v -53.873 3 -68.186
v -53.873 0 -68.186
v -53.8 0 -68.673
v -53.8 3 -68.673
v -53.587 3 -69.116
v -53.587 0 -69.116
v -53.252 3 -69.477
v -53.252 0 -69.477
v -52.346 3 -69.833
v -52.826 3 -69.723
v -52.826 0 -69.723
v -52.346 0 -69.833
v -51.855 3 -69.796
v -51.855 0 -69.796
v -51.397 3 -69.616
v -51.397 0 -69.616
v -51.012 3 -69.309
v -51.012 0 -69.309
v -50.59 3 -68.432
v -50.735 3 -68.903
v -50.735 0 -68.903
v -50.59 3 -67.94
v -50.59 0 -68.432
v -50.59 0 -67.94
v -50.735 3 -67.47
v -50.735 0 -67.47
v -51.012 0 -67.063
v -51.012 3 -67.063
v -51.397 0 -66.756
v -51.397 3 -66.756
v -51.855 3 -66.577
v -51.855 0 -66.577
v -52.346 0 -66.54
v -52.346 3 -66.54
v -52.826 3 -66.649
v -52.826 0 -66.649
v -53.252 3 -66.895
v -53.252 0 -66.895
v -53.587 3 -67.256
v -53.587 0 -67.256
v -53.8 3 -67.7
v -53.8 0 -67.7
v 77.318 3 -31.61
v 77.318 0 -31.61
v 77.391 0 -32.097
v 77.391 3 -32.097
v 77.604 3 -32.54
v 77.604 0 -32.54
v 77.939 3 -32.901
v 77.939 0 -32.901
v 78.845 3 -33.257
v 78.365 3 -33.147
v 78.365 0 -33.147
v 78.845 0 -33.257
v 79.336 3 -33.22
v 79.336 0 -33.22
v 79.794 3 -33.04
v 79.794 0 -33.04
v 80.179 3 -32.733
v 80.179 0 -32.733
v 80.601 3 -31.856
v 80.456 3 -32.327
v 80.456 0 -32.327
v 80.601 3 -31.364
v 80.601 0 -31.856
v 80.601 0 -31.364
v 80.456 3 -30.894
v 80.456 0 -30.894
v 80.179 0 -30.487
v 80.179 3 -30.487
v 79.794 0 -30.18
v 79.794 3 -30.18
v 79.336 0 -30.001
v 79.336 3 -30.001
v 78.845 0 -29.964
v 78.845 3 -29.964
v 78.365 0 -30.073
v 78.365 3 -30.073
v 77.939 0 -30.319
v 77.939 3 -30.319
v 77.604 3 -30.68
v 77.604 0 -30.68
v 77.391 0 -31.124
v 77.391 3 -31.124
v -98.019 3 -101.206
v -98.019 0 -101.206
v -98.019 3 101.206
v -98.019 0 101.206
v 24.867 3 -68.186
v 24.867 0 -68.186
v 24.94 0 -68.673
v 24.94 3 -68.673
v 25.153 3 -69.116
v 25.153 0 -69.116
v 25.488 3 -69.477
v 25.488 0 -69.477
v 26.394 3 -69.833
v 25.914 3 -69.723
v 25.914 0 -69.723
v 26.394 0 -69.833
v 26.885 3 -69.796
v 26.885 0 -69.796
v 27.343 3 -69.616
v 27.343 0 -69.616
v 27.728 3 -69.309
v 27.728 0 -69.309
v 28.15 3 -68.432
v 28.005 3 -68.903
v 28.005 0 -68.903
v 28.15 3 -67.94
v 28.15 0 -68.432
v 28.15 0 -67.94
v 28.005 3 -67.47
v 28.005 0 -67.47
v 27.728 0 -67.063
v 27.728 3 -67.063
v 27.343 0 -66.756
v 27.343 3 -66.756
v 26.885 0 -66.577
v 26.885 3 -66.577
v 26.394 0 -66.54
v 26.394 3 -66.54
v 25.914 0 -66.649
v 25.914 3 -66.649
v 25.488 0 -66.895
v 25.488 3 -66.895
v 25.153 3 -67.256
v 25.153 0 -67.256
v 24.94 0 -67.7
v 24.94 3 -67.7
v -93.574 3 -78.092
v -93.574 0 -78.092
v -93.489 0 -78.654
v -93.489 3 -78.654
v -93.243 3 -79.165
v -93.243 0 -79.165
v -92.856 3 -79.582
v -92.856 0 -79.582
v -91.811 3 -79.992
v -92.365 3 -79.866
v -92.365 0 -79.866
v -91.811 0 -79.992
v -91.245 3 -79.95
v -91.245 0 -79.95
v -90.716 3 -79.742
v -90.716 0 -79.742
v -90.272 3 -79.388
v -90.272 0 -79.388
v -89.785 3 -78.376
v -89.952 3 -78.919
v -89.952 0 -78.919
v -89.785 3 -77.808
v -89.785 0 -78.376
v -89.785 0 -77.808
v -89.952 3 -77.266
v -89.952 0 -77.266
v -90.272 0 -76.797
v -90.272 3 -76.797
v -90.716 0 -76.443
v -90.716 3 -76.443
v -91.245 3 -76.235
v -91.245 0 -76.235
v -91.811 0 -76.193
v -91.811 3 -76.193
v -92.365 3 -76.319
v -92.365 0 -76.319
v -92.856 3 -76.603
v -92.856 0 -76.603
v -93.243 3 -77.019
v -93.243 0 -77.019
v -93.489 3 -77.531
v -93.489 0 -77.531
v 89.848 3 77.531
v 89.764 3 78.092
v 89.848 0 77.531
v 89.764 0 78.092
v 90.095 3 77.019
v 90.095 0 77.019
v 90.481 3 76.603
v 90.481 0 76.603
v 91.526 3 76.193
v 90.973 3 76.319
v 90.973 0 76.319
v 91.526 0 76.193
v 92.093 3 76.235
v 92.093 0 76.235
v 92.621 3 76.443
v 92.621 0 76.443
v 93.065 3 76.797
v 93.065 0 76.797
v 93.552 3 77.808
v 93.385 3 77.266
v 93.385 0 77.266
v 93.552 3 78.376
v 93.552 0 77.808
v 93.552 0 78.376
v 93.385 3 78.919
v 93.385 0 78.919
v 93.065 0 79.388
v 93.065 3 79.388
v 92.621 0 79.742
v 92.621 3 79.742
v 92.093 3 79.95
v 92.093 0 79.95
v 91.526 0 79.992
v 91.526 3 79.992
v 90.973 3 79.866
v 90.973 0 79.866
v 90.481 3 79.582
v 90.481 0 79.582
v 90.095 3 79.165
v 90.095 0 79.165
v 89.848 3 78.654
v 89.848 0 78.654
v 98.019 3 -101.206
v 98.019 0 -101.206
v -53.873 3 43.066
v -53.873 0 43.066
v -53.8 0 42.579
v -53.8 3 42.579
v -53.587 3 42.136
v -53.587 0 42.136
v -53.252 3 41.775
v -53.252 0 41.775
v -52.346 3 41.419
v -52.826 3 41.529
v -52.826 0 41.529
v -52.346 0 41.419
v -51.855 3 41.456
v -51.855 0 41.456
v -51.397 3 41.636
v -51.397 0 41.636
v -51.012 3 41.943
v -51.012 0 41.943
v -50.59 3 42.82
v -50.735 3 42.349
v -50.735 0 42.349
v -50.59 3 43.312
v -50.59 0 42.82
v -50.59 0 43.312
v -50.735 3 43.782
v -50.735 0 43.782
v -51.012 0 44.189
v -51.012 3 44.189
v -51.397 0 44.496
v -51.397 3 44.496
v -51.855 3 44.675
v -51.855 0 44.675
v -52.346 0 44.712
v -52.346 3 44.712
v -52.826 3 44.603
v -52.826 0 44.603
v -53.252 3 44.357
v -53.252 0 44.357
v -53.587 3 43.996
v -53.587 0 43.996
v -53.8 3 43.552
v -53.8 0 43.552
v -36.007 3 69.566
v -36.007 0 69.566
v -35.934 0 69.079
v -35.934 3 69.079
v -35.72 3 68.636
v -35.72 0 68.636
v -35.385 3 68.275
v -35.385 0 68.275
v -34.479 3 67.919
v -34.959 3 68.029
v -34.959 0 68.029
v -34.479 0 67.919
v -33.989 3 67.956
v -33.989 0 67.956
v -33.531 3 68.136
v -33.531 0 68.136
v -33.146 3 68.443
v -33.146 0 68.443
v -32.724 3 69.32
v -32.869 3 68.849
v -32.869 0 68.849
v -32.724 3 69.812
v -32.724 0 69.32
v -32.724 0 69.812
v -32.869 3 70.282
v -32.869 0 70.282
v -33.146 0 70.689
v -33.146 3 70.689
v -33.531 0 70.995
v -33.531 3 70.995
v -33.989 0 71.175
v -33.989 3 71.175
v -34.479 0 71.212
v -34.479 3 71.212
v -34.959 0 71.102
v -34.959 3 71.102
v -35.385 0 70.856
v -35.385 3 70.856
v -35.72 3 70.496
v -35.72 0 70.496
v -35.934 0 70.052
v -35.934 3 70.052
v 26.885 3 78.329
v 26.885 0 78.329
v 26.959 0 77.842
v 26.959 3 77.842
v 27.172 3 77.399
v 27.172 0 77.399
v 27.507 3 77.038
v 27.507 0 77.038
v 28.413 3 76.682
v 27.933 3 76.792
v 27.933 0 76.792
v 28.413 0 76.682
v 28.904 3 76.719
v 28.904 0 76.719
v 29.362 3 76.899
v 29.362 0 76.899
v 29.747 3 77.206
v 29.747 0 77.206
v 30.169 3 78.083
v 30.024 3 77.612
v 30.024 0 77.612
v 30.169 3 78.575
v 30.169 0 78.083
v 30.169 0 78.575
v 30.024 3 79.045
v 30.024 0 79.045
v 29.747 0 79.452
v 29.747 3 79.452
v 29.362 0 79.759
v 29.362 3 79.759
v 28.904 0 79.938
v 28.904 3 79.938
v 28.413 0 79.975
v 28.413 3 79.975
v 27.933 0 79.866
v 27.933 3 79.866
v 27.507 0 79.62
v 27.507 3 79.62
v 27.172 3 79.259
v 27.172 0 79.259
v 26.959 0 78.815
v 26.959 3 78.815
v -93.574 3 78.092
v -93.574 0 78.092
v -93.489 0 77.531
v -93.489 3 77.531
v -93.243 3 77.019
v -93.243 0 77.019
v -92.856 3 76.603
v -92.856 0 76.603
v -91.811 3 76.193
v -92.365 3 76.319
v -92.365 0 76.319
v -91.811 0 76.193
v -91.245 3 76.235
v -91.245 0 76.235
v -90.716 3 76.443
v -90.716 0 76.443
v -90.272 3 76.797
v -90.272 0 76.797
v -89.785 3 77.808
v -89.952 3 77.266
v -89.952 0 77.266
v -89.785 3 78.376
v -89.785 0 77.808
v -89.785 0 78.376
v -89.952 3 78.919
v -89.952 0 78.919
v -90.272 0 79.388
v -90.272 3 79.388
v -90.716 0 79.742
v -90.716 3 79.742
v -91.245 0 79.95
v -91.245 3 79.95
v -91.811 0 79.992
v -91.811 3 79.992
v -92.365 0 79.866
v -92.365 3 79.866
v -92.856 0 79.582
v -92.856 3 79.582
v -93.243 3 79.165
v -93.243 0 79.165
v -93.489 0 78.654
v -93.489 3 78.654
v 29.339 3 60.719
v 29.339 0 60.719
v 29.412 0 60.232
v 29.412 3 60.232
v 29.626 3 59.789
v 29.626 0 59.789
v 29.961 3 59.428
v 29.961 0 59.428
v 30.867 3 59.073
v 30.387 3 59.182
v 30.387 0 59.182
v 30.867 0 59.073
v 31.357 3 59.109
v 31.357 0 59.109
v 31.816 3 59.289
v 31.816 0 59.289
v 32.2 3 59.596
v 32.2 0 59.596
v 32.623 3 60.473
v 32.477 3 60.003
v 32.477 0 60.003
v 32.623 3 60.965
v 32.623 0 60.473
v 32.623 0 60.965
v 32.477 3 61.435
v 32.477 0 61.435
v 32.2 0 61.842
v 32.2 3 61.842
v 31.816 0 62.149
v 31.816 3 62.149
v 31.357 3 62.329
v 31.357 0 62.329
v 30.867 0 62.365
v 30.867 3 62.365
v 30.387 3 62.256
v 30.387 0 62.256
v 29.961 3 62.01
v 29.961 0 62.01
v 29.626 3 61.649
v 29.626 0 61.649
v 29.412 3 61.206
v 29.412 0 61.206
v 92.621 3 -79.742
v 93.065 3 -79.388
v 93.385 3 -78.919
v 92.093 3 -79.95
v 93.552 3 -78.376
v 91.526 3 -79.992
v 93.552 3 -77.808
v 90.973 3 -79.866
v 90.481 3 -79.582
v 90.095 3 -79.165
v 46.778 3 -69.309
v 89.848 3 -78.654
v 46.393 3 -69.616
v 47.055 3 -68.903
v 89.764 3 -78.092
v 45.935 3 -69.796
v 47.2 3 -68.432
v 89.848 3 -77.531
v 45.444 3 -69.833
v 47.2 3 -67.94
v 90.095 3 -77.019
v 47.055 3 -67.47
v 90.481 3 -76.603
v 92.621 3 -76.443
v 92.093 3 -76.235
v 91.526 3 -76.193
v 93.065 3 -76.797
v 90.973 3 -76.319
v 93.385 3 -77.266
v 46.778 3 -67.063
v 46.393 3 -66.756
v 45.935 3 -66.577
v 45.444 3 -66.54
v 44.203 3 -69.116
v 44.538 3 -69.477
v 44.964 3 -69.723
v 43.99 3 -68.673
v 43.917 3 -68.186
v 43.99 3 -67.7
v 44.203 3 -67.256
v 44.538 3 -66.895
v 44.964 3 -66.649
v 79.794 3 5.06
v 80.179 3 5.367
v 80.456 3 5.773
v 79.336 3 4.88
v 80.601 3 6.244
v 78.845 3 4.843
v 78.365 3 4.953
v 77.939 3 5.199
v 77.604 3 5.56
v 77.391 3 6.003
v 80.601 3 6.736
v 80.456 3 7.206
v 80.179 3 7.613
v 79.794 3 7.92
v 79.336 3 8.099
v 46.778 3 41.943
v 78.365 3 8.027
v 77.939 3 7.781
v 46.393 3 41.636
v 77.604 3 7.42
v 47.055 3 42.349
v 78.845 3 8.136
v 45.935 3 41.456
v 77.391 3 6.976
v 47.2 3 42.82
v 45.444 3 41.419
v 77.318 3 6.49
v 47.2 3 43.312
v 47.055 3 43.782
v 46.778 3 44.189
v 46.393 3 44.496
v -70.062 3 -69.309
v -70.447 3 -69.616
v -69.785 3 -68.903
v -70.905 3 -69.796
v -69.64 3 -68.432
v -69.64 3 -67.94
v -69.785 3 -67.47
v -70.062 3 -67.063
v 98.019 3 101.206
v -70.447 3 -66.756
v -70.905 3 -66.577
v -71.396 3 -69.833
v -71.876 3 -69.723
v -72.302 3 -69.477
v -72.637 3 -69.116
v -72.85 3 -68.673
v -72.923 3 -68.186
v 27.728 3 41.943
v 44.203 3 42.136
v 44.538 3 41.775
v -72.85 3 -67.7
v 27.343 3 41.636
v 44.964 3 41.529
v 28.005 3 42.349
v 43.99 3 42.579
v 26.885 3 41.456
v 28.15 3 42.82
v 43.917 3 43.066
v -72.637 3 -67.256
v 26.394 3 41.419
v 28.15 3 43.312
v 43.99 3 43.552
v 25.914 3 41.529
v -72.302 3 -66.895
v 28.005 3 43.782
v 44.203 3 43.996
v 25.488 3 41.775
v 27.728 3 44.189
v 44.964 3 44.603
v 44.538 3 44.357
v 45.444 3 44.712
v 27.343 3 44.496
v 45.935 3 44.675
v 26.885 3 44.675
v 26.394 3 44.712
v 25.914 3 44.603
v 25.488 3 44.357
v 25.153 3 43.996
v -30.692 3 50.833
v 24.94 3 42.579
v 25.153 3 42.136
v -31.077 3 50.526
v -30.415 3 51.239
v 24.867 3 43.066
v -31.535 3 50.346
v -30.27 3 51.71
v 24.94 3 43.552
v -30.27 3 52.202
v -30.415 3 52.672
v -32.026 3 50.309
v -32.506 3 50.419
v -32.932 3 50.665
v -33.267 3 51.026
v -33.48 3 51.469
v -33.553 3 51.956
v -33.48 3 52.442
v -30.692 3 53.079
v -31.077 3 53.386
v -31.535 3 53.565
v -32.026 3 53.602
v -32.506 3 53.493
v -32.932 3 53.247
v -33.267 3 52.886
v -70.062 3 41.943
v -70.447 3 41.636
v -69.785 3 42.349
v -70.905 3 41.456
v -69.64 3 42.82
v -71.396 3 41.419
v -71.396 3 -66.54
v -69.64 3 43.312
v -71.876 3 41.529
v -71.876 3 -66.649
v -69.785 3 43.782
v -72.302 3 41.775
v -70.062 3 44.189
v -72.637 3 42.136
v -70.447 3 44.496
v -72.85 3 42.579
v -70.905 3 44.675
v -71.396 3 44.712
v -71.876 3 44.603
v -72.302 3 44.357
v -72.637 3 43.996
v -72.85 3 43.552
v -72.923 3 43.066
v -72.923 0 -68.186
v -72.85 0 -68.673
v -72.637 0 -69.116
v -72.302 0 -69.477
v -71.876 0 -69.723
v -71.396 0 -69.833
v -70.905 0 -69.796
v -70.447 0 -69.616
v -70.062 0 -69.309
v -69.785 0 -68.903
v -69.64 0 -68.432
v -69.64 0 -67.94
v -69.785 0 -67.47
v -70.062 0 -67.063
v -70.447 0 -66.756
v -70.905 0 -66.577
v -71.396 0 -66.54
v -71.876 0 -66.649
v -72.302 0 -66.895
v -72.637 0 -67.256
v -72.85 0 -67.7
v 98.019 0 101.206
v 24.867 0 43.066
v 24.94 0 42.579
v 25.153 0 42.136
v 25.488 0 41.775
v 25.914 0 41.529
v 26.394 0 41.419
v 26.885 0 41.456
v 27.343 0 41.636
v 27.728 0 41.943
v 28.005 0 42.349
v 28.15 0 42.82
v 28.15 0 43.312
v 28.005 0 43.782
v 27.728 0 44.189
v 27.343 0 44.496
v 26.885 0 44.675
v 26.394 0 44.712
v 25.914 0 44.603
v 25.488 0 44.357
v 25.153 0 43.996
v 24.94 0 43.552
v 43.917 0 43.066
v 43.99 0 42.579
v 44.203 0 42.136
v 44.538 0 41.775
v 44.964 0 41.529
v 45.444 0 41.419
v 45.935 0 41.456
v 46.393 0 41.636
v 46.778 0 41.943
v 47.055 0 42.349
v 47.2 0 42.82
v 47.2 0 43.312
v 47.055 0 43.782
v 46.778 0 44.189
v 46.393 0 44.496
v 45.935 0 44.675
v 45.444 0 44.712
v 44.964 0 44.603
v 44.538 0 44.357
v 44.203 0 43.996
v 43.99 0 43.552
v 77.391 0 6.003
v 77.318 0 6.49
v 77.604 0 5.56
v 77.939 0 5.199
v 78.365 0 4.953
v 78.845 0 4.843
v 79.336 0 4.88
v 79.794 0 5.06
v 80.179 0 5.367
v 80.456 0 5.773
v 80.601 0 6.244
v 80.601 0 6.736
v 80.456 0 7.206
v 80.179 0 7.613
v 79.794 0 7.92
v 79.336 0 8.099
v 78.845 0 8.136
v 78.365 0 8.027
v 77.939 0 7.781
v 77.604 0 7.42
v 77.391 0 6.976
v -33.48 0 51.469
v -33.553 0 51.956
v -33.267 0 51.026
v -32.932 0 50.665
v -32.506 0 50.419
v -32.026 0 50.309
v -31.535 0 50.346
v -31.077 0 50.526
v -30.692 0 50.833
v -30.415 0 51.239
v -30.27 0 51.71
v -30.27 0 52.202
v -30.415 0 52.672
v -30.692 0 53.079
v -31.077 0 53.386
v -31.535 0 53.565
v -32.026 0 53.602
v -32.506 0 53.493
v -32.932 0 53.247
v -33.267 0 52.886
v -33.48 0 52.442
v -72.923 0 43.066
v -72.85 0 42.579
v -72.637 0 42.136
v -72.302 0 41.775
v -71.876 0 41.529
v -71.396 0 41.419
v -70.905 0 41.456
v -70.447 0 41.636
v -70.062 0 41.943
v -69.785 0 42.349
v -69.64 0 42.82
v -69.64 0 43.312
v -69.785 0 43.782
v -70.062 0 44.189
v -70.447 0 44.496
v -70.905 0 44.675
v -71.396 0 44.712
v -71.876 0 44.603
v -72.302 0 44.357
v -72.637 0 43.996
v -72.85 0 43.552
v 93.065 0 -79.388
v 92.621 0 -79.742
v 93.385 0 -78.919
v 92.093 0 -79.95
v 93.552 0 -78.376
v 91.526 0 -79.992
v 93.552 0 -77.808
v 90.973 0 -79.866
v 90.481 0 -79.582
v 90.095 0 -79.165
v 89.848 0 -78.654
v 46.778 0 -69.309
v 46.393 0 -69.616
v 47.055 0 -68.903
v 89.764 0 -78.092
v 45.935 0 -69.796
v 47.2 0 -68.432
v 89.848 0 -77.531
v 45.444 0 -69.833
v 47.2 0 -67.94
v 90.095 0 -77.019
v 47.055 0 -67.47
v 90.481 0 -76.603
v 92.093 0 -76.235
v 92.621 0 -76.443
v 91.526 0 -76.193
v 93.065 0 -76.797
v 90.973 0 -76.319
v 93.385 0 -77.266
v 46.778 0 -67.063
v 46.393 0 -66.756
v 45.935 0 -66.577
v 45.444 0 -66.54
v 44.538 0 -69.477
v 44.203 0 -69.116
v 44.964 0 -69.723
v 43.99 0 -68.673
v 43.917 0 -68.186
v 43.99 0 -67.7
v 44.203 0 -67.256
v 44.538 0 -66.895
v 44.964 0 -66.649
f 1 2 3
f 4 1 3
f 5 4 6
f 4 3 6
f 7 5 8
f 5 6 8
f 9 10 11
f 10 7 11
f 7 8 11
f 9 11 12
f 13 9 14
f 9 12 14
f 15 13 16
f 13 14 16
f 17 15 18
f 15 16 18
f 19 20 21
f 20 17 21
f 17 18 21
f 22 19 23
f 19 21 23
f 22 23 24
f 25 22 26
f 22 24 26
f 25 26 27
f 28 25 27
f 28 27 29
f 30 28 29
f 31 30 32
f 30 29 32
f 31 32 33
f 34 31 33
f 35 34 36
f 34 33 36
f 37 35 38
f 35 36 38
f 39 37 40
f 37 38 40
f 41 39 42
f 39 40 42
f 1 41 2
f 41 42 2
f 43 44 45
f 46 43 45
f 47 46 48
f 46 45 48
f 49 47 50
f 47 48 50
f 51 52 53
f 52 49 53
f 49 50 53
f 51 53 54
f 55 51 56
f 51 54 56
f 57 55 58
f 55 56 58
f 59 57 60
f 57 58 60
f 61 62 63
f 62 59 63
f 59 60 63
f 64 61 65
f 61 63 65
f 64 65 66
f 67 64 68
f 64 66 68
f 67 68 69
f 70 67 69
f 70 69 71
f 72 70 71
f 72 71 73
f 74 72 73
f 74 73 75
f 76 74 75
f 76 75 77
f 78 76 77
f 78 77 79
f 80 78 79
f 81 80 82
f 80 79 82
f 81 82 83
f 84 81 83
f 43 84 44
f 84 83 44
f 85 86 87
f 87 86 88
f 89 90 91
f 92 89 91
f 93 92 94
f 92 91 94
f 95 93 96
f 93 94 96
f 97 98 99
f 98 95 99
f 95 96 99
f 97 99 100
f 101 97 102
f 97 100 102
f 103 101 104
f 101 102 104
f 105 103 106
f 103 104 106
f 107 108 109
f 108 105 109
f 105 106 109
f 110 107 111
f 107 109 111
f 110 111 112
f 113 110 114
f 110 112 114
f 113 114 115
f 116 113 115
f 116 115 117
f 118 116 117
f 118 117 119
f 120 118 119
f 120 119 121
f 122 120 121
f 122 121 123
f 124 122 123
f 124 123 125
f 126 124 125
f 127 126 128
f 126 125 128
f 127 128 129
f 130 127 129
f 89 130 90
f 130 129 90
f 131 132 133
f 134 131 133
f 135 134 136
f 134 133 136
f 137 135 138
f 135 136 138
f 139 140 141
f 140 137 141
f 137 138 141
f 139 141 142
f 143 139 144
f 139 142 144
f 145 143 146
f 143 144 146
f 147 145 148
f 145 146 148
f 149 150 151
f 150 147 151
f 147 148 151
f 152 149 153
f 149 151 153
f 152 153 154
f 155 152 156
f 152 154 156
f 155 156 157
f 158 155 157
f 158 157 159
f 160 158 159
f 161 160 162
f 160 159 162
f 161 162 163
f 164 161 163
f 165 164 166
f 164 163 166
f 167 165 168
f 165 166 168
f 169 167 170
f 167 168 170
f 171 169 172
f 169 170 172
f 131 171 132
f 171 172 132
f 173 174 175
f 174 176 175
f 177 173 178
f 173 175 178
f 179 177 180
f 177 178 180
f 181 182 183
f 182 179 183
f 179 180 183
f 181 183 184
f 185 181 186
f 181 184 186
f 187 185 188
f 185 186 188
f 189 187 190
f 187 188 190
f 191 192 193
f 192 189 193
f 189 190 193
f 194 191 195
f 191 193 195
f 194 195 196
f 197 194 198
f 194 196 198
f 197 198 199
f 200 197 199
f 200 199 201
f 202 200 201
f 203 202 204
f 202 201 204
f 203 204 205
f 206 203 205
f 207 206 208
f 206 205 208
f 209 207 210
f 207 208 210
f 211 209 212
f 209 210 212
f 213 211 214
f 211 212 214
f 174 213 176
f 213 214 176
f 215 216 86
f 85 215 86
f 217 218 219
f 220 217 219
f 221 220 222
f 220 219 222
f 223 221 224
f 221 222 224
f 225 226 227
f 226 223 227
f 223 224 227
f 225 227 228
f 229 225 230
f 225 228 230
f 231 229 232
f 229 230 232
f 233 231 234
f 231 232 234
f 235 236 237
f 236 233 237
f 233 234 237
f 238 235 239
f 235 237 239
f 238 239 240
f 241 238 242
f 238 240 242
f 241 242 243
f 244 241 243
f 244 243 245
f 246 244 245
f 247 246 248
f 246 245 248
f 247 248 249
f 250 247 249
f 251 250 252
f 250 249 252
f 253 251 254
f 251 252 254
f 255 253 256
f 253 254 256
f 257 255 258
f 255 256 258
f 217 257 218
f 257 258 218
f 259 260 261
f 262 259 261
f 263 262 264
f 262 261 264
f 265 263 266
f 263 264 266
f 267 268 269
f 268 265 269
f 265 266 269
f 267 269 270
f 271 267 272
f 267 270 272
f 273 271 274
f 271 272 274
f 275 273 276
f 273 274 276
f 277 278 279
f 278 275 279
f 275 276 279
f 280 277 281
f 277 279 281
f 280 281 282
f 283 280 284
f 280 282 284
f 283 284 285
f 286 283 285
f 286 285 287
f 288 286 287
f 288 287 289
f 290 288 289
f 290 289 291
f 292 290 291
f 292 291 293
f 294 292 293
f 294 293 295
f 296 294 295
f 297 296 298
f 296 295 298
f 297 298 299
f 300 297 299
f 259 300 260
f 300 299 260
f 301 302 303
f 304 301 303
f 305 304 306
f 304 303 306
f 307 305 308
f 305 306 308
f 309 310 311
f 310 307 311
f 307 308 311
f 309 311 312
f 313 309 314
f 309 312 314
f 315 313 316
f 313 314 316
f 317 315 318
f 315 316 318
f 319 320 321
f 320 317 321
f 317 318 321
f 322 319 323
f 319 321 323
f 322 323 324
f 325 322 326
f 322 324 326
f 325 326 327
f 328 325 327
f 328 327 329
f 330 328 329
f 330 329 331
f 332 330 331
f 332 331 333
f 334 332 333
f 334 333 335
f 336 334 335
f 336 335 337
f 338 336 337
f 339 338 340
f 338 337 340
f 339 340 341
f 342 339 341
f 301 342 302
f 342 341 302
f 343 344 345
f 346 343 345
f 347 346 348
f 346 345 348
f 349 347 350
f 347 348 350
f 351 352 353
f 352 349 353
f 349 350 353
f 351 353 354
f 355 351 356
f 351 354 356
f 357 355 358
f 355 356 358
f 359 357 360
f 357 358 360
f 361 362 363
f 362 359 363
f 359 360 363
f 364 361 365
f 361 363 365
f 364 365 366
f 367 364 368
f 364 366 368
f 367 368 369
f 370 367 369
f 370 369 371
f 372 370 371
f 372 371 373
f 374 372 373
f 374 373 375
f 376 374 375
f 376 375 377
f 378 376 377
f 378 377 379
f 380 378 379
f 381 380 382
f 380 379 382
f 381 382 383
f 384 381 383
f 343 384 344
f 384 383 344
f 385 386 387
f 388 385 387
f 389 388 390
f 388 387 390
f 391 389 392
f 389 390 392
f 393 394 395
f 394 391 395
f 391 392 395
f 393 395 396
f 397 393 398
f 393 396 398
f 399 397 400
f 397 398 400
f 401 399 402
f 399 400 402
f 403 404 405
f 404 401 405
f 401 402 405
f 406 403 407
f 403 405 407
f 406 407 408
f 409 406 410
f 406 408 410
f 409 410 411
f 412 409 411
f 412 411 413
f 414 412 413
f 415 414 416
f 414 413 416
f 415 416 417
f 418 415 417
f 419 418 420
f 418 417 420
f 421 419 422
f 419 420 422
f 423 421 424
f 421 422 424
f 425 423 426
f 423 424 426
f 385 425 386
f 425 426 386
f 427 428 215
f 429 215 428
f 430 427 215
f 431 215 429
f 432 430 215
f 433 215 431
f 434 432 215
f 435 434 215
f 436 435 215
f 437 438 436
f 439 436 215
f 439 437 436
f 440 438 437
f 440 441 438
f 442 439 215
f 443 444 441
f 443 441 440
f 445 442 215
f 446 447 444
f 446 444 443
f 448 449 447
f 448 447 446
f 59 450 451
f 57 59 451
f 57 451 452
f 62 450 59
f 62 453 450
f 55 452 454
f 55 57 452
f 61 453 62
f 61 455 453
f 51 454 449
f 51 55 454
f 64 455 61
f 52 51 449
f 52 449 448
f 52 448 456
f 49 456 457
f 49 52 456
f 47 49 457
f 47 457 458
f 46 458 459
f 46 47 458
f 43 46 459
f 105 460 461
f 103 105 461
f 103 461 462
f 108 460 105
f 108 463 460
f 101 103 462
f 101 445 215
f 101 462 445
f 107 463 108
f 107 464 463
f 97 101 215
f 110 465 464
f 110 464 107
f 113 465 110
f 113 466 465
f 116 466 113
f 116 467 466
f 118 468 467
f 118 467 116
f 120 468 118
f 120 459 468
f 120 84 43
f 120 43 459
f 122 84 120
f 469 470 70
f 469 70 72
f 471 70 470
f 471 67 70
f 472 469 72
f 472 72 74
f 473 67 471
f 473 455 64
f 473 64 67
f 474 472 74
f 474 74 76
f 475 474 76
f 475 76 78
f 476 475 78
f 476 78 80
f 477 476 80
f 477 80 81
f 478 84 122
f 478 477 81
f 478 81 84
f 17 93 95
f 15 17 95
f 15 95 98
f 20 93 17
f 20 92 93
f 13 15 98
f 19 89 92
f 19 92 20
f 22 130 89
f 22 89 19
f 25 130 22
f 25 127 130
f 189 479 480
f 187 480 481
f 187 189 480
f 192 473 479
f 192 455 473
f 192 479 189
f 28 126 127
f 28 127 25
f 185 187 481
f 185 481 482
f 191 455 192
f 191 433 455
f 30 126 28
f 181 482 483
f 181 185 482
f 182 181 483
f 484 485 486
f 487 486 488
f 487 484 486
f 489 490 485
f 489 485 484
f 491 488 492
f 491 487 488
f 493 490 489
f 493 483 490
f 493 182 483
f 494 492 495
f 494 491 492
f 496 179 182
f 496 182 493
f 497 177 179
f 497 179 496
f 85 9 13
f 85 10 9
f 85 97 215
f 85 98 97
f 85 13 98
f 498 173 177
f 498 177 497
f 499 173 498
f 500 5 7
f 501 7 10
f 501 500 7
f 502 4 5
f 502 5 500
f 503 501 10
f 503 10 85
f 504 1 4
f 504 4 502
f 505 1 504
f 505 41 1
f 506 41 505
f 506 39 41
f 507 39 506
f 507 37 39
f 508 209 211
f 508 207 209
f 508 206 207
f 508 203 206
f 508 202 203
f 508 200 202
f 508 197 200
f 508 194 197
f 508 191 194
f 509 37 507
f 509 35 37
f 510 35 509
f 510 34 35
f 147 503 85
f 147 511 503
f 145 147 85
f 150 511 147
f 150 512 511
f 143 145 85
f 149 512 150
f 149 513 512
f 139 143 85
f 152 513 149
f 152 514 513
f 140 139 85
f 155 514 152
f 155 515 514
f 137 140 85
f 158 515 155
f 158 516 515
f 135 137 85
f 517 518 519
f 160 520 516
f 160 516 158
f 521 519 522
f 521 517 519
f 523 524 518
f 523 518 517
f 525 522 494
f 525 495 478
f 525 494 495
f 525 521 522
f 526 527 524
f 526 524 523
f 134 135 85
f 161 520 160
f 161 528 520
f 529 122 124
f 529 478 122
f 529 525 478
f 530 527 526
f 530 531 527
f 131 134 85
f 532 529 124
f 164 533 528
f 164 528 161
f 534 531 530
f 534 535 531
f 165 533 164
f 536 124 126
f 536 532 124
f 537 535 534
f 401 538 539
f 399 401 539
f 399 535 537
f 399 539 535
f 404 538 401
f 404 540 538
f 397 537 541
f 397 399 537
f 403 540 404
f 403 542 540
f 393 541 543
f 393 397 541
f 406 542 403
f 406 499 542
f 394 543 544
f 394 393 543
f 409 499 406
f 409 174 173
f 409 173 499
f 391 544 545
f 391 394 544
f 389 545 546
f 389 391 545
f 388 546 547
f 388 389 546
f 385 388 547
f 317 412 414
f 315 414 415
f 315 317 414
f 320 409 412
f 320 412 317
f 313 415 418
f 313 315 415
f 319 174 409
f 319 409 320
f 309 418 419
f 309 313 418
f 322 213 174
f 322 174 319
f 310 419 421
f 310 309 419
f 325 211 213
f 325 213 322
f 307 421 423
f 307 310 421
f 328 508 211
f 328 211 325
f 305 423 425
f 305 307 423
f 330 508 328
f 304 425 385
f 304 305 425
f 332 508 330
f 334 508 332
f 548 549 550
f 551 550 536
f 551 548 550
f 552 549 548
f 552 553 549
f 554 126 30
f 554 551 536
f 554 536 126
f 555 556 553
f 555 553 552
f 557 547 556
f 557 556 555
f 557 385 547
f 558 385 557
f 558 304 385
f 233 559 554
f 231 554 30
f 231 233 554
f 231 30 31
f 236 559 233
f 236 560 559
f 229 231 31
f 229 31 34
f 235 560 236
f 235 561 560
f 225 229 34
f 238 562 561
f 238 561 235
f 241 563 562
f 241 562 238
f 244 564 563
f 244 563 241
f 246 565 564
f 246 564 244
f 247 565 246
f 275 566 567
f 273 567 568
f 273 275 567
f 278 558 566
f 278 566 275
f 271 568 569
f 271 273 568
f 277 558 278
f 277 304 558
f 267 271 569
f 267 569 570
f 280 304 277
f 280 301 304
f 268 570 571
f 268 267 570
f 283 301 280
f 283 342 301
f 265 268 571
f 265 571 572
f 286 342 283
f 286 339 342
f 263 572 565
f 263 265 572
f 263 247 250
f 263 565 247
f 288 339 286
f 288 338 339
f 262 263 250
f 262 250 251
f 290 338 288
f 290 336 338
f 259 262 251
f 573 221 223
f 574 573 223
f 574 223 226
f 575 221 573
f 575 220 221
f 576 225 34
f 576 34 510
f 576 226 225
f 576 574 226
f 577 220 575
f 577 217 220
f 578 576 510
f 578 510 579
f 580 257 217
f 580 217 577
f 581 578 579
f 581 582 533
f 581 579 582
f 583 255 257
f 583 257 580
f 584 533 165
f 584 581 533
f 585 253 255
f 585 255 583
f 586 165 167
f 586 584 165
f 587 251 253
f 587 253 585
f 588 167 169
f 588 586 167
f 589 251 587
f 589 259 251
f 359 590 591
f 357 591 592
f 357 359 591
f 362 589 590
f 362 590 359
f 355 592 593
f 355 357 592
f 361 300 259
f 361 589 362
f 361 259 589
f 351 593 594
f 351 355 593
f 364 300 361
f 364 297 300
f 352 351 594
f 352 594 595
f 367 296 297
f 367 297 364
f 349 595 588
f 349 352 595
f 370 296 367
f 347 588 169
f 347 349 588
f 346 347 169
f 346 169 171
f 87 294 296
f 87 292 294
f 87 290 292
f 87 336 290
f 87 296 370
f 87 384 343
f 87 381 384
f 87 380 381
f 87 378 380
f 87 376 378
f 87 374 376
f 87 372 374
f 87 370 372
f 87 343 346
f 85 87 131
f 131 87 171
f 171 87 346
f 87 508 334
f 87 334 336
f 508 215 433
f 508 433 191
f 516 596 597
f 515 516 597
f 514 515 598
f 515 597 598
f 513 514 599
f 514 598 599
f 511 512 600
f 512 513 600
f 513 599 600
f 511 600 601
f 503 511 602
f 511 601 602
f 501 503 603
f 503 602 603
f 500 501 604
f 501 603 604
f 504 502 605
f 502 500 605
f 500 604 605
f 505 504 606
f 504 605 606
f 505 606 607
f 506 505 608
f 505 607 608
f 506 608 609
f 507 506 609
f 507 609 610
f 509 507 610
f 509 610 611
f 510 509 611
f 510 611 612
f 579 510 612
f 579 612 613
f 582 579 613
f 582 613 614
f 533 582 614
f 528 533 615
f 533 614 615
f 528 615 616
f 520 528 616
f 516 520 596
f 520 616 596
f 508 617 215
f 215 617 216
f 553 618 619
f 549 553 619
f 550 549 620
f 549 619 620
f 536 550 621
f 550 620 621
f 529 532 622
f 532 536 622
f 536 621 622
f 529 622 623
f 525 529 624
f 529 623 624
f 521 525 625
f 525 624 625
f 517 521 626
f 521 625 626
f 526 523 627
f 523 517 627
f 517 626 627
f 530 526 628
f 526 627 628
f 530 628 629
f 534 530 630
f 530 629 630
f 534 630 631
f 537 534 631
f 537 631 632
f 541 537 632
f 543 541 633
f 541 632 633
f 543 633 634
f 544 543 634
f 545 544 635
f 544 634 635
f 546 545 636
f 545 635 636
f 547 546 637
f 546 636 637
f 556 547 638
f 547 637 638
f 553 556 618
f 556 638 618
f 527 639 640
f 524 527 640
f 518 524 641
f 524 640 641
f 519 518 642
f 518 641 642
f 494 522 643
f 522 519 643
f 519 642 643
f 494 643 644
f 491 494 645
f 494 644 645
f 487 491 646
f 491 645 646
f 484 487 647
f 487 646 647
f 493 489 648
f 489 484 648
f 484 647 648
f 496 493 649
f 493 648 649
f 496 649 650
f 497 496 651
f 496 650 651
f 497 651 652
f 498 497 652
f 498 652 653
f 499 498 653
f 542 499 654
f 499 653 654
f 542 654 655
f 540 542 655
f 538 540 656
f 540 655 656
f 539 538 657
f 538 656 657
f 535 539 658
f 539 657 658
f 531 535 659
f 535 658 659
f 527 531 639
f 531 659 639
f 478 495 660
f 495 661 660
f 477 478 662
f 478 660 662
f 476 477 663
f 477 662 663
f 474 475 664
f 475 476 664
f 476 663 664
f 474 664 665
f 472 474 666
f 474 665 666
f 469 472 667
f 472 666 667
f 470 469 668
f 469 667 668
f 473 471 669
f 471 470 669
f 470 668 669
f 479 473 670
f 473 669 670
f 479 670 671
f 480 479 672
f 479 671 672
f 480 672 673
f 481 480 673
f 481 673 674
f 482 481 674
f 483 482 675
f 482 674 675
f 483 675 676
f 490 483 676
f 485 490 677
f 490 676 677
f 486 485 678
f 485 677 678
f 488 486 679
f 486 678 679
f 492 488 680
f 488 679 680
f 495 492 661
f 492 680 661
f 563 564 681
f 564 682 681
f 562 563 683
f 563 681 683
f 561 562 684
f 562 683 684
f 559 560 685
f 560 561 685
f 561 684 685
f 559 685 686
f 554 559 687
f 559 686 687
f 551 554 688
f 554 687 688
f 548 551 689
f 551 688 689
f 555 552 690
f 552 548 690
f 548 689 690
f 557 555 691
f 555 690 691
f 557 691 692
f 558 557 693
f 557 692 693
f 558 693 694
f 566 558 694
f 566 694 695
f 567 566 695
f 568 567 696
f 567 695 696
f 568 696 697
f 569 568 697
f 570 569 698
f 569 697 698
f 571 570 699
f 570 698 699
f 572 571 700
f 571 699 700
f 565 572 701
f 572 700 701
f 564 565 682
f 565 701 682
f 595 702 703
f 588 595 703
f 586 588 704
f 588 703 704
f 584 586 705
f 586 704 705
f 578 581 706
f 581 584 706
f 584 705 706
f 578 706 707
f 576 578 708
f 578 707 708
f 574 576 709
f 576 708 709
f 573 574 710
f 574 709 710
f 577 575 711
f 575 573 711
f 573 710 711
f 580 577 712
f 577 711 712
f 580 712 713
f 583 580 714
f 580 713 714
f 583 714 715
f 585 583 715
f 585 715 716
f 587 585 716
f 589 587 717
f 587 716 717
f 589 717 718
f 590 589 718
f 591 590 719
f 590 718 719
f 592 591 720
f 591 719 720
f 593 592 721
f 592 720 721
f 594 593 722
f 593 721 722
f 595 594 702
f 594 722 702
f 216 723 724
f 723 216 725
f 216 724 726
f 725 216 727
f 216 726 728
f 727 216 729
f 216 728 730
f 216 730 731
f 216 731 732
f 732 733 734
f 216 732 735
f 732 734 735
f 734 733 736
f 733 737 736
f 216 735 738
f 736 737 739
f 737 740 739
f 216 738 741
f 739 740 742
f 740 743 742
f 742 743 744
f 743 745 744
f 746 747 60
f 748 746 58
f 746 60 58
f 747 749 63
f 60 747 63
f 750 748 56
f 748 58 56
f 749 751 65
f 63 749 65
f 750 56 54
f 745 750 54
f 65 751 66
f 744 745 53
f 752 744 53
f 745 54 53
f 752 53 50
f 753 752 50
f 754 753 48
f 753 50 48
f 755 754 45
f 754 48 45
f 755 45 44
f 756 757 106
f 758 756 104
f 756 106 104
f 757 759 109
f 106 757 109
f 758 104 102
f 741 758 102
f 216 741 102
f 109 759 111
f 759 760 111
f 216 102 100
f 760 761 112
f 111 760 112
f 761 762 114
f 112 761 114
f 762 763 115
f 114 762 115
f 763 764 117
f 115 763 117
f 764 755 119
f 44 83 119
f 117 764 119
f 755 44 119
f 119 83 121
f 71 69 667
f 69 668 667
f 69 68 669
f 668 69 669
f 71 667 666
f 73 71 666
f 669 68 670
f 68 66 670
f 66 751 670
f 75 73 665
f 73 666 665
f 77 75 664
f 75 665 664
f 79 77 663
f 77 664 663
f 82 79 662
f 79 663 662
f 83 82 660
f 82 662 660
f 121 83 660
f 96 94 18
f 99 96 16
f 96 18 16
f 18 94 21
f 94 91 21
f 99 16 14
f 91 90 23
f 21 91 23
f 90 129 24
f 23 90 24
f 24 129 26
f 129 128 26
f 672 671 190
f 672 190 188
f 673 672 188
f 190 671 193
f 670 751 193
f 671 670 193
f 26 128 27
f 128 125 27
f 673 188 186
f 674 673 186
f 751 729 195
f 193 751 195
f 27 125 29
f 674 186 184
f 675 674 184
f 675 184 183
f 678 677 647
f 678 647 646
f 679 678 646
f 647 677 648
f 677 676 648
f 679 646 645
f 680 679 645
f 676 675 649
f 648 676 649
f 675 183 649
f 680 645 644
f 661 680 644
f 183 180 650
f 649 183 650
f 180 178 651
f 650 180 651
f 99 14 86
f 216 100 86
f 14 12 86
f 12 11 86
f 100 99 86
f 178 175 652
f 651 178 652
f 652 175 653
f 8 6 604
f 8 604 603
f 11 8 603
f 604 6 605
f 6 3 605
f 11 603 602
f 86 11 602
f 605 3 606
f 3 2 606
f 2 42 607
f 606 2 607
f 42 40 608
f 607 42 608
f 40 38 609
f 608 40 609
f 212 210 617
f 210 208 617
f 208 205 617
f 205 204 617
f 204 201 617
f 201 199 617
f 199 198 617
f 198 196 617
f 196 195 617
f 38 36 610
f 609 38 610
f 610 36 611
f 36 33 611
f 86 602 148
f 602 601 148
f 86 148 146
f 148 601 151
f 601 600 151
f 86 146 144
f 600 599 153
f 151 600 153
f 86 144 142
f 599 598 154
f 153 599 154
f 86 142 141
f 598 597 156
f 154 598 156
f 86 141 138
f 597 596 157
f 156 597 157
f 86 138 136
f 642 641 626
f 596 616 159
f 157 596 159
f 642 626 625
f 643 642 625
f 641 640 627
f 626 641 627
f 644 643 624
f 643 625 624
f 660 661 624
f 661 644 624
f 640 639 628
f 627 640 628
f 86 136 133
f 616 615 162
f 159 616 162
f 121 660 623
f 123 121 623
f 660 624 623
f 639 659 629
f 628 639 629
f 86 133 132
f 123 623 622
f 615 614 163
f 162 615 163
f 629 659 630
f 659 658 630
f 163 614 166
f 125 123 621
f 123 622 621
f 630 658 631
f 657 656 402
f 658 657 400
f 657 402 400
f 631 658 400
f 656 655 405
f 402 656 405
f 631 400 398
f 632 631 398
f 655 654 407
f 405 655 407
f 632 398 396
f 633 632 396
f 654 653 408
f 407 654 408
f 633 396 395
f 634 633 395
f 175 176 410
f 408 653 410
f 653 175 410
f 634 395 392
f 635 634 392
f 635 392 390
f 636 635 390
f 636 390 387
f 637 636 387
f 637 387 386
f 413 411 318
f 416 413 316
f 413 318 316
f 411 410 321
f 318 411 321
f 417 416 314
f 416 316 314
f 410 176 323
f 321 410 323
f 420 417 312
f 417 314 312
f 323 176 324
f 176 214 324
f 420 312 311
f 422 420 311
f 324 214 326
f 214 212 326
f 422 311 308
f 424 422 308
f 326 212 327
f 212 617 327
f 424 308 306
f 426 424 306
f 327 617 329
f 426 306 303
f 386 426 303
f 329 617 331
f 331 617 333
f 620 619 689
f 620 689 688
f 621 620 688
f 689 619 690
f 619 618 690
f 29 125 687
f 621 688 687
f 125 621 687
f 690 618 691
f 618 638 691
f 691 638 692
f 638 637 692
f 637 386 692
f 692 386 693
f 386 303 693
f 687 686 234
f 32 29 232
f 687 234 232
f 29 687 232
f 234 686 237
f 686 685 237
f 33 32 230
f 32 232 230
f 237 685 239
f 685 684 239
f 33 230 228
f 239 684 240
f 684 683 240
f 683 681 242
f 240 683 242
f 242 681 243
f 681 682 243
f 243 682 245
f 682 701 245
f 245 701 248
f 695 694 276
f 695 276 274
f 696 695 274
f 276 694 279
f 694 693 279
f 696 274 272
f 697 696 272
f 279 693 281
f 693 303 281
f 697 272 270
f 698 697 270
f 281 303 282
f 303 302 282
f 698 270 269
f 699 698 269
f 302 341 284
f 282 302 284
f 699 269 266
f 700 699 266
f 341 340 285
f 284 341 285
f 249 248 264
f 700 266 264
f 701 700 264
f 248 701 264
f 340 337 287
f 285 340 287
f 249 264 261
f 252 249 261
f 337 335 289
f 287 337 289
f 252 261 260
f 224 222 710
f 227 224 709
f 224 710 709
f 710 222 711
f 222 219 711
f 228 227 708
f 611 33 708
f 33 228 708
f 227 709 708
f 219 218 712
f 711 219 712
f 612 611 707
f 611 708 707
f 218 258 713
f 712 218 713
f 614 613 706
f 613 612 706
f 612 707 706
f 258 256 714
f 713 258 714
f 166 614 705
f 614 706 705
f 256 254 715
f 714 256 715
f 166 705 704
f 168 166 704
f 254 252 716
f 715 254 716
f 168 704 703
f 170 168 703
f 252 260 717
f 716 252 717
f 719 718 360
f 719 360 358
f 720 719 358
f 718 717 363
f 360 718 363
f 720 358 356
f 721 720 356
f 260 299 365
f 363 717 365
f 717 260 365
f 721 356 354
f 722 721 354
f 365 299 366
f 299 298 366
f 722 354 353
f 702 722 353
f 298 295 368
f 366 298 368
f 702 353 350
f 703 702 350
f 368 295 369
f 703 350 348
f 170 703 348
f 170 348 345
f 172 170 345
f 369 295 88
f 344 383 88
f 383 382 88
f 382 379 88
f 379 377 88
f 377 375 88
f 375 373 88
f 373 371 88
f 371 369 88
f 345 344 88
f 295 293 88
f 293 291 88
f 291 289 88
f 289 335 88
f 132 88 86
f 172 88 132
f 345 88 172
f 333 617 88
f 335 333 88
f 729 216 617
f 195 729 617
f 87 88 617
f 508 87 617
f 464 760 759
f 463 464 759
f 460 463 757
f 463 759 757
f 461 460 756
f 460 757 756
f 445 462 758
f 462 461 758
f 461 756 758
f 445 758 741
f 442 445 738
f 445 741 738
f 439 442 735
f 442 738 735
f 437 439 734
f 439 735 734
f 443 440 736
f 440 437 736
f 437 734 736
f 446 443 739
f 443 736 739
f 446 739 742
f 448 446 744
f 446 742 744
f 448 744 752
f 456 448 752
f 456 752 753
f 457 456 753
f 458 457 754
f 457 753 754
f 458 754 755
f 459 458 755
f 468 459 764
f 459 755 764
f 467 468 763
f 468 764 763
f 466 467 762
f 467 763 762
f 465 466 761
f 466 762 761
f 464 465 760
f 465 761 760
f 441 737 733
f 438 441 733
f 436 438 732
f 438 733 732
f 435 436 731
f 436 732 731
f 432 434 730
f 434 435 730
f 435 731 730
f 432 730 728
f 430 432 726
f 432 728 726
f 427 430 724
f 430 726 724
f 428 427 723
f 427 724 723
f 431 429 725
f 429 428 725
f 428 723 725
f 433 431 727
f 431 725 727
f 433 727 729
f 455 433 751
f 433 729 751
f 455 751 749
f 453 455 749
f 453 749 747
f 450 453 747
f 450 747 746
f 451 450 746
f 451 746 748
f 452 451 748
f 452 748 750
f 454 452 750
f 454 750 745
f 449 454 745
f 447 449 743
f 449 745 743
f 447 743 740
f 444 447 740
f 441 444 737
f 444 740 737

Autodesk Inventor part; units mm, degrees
ref_plane "YZ Plane" through (0, 0, 0) normal (1, 0, 0) x (0, 1, 0)
ref_plane "XZ Plane" through (0, 0, 0) normal (0, 1, 0) x (-1, 0, 0)
ref_plane "XY Plane" through (0, 0, 0) normal (0, 0, 1) x (1, 0, 0)
sketch "Block1" plane through (0, 0, 0) normal (0, 0, 1) x (1, 0, 0)
  circle A0 centre (244.9891, 313.0766) radius 1.651
  circle A1 centre (305.4278, 286.7035) radius 1.651
  circle A2 centre (242.5353, 295.4667) radius 1.651
  circle A3 centre (307.8815, 304.3134) radius 1.651
  circle A4 centre (325.7478, 277.8135) radius 1.651
  circle A5 centre (227.9578, 277.8135) radius 1.651
  circle A6 centre (194.5568, 203.1375) radius 1.651
  circle A7 centre (325.7478, 166.5615) radius 1.651
  circle A8 centre (227.9578, 166.5615) radius 1.651
  circle A9 centre (247.0078, 166.5615) radius 1.651
  circle A10 centre (344.7978, 166.5615) radius 1.651
  circle A11 centre (194.5568, 241.2375) radius 1.651
  circle A12 centre (247.0078, 277.8135) radius 1.651
  circle A13 centre (344.7978, 277.8135) radius 1.651
  circle A14 centre (181.8568, 156.6555) radius 1.905
  circle A15 centre (181.8568, 312.8401) radius 1.905
  circle A16 centre (365.194, 312.8401) radius 1.905
  circle A17 centre (365.194, 156.6555) radius 1.905
  line L0 (371.544, 133.5415) -> (371.544, 335.9541)
  line L1 (175.5068, 133.5415) -> (371.544, 133.5415)
  line L2 (175.5068, 335.9541) -> (175.5068, 133.5415)
  line L3 (371.544, 335.9541) -> (175.5068, 335.9541)
  point P0 (271.6644, 239.9388)
sketch "Sketch1" plane through (0, 0, 0) normal (0, 1, 0) x (-1, 0, 0)
  circle A0 centre (-28.5363, 78.3288) radius 1.651
  circle A1 centre (31.9024, 51.9557) radius 1.651
  circle A2 centre (-30.99, 60.7189) radius 1.651
  circle A3 centre (34.3561, 69.5656) radius 1.651
  circle A4 centre (52.2224, 43.0657) radius 1.651
  circle A5 centre (-45.5676, 43.0657) radius 1.651
  circle A6 centre (-78.9686, -31.6103) radius 1.651
  circle A7 centre (52.2224, -68.1863) radius 1.651
  circle A8 centre (-45.5676, -68.1863) radius 1.651
  circle A9 centre (-26.5176, -68.1863) radius 1.651
  circle A10 centre (71.2724, -68.1863) radius 1.651
  circle A11 centre (-78.9686, 6.4897) radius 1.651
  circle A12 centre (-26.5176, 43.0657) radius 1.651
  circle A13 centre (71.2724, 43.0657) radius 1.651
  circle A14 centre (-91.6686, -78.0923) radius 1.905
  circle A15 centre (-91.6686, 78.0923) radius 1.905
  circle A16 centre (91.6686, 78.0923) radius 1.905
  circle A17 centre (91.6686, -78.0923) radius 1.905
  line L0 (98.0186, -101.2063) -> (98.0186, 101.2063)
  line L1 (-98.0186, -101.2063) -> (98.0186, -101.2063)
  line L2 (-98.0186, 101.2063) -> (-98.0186, -101.2063)
  line L3 (98.0186, 101.2063) -> (-98.0186, 101.2063)
  point P0 (0, 0)
  point P1 (0, -101.2063)
  point P2 (-98.0186, 0)
extrude "Extrusion1" add sketch "Sketch1" along normal blind 3
properties part number "BottomPlate"
